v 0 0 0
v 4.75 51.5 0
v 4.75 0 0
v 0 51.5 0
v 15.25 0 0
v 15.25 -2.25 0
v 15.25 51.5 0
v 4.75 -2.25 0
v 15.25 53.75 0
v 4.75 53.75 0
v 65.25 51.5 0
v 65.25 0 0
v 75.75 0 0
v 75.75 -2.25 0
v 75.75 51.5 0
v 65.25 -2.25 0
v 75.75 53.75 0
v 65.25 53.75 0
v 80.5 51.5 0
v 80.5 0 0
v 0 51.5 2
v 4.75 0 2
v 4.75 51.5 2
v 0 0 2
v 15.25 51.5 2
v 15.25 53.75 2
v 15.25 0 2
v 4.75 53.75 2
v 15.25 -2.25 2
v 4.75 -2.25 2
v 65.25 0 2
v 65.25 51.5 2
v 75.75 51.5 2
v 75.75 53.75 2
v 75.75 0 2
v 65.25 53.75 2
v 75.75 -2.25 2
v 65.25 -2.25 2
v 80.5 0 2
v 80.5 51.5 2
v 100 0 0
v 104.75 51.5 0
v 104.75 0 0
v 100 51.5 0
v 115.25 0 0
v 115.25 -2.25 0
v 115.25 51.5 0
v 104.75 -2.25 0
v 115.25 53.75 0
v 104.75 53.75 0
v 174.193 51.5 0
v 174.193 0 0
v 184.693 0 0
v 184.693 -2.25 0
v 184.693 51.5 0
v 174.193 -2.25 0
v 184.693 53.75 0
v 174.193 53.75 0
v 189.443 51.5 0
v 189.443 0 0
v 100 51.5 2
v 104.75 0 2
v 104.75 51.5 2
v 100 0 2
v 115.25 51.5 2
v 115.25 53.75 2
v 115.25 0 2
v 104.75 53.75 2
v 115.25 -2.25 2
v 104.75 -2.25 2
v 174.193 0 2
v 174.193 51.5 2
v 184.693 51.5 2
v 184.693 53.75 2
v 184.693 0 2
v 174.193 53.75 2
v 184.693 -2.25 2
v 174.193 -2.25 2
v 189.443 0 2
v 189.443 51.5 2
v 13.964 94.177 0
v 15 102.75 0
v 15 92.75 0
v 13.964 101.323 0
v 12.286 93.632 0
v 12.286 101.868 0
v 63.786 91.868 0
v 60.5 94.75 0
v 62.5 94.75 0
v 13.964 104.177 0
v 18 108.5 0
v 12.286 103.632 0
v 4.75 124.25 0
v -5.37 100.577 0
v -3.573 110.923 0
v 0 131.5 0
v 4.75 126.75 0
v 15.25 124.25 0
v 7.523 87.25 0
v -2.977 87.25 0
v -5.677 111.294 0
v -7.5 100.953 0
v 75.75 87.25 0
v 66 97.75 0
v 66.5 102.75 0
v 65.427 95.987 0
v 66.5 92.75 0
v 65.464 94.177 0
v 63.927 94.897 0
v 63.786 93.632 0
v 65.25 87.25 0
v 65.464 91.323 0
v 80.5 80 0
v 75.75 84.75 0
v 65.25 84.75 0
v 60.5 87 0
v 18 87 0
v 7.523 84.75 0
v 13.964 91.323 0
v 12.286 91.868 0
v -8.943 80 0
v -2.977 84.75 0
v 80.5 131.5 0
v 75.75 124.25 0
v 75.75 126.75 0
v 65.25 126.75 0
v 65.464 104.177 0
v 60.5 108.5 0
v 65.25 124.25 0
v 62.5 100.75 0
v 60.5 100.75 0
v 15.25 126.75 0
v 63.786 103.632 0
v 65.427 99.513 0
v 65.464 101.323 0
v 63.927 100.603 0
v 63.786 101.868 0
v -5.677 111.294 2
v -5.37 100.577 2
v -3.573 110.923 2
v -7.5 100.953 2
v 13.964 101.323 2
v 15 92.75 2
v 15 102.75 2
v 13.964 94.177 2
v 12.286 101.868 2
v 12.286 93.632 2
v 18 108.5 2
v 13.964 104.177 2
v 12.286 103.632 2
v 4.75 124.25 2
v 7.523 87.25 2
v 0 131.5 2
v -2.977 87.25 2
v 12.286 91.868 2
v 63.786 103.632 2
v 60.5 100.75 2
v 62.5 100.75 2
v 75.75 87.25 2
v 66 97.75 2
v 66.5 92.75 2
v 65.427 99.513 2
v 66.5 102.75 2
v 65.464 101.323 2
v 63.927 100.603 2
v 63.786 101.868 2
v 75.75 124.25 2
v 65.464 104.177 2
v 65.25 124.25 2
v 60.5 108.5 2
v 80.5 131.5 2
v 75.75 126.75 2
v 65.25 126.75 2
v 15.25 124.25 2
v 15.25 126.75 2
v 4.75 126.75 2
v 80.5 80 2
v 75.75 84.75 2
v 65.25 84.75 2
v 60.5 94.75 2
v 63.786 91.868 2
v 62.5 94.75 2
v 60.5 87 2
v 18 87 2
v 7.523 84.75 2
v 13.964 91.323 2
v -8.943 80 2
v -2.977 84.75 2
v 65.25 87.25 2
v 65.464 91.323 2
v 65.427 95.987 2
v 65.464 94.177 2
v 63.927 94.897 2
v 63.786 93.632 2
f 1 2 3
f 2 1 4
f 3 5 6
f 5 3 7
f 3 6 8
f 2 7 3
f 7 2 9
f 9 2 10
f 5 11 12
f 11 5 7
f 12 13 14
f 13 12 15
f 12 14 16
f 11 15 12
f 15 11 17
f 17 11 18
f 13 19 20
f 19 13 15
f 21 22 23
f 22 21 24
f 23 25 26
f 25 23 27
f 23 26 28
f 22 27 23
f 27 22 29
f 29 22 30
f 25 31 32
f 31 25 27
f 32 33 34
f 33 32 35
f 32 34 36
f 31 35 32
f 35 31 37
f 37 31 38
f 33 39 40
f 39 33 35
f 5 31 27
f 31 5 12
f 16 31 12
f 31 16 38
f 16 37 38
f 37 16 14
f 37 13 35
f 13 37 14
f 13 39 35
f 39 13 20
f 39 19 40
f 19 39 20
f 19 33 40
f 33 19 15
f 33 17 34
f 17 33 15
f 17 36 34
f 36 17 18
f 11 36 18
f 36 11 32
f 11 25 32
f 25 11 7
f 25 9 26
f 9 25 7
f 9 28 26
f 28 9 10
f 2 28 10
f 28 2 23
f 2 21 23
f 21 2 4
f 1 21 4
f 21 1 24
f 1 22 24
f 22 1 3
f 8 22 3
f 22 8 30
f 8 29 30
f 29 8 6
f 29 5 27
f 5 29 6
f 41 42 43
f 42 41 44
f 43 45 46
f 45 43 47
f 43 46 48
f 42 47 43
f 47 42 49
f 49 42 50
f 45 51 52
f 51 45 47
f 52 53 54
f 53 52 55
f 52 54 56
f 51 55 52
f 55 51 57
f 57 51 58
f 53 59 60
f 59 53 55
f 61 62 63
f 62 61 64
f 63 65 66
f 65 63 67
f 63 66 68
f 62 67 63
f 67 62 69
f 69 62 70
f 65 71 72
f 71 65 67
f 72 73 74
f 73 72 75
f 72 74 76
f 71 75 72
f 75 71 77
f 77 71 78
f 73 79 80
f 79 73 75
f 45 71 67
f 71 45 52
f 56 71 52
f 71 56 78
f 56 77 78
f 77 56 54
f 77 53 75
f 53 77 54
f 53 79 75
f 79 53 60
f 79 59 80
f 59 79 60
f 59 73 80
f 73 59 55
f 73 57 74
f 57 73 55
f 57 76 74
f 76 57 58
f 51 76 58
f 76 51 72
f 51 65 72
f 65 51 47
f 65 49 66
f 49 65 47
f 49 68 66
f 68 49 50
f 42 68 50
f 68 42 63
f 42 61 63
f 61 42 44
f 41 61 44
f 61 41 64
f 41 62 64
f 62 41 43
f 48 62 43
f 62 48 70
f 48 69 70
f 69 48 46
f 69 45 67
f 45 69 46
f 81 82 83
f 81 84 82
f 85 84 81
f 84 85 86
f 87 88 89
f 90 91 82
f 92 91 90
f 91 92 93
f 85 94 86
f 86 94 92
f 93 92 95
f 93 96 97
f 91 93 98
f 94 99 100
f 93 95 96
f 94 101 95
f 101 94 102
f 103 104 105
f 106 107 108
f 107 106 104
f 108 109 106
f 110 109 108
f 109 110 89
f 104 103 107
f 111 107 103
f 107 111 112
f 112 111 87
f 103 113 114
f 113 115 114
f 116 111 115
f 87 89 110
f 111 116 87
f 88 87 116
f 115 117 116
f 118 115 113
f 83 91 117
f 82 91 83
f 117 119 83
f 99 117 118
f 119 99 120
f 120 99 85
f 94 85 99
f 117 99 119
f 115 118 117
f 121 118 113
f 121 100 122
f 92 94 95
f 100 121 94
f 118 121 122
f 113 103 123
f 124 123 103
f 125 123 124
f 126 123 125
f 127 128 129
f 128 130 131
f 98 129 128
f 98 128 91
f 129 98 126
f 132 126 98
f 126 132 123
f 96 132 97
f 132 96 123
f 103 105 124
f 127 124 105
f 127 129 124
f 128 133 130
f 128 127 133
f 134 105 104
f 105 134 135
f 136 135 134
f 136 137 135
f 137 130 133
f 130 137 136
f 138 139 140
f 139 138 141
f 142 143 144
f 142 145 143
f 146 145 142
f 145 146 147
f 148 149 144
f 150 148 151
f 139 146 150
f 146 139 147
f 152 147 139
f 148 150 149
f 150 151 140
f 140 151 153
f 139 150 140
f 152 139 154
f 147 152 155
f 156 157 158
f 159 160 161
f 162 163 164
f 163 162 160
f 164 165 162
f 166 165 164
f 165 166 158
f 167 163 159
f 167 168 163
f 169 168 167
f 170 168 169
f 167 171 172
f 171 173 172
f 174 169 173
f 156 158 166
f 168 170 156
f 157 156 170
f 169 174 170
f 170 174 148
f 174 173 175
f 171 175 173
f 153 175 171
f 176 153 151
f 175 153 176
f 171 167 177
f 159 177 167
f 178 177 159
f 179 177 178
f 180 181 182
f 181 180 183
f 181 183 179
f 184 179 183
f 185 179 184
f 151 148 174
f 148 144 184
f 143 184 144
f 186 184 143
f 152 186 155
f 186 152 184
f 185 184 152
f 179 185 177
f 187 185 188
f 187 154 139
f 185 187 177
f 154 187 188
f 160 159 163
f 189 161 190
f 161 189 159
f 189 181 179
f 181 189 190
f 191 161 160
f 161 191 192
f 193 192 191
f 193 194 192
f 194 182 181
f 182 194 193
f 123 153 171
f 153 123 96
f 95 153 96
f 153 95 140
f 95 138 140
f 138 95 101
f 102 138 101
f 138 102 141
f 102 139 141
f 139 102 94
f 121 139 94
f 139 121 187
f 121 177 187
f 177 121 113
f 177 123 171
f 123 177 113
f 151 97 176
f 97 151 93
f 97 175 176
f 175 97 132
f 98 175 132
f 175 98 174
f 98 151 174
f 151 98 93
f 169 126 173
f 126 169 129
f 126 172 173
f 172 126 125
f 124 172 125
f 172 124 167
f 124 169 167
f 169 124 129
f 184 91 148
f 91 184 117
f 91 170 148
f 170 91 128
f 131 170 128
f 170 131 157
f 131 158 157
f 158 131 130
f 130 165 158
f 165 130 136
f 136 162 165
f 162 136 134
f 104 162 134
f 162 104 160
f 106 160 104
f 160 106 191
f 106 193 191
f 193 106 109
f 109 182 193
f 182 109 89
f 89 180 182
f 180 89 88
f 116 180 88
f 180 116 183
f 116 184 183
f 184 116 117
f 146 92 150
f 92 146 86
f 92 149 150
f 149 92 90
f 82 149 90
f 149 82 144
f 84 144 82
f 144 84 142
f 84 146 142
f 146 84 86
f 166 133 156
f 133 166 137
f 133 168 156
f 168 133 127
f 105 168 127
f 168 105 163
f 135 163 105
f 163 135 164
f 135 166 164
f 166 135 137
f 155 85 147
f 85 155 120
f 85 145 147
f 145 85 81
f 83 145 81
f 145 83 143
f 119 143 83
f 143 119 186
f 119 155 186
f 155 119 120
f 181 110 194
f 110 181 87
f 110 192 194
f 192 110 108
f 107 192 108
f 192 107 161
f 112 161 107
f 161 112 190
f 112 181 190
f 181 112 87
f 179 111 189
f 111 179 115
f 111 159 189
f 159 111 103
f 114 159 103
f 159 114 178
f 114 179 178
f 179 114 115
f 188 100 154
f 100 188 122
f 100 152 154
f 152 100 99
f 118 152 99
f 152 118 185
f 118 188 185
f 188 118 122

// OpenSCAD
/* Parameters */

material_thickness = 2;
battery_case_height = 16;
servo_height = 21.5;
servo_length = 42.5;
sled_length = 80.5;
tab_edge_distance = 5;
tab_spacing = 0.5;
tab_length = 10;
ramp_angle = 80;

screw_diameter = 3;


/* Calculated Values */

sled_height = ((material_thickness + tab_edge_distance) * 2 ) + 
	servo_height + battery_case_height;
ramp_length = cos( ramp_angle ) * sled_height;
side_length = sled_length + ramp_length;

/* Functions */

module servo_hole() {
	square([servo_length, servo_height]);
	// screw holes
	translate([-4.5,(servo_height/2)+5])
		circle(d=screw_diameter);
	translate([-4.5,(servo_height/2)-5])
		circle(d=screw_diameter);
	translate([servo_length+4.5,(servo_height/2)+5])
		circle(d=screw_diameter);
	translate([servo_length+4.5,(servo_height/2)-5])
		circle(d=screw_diameter);
	// wire hole
	hull() {
		translate([servo_length-1,servo_height/2])
			square(6,center=true);
		translate([servo_length+2.5,servo_height/2])
			circle(3,center=true);
	}

}

module tab() {
square([tab_length, material_thickness]);
}

module tab_hole() {
	translate([tab_spacing/-2,tab_spacing/-2])
		square([tab_length + tab_spacing, material_thickness +tab_spacing]);
}

module tab() {
	tab_hole();
}


module side() {
	linear_extrude(height=material_thickness)
	difference() {

		union() {
			square([sled_length, sled_height]);
			polygon([[0,0], [0,sled_height], [-ramp_length,0]] );
			translate([-ramp_length/2,sled_height/2])
				rotate(ramp_angle)
				translate([-tab_length/2,-0.1])
				tab();
		}
	
		// Servo hole
		translate([sled_length - servo_length - tab_length - tab_edge_distance - tab_edge_distance, 
				material_thickness + tab_edge_distance])
			servo_hole();

		// Bottom right
		translate([sled_length - tab_length - tab_edge_distance, tab_edge_distance])
			tab_hole();

		// Bottom Left
		translate([-ramp_length + tab_edge_distance + cos(ramp_angle)*(tab_edge_distance+material_thickness), 
				tab_edge_distance])
			tab_hole();

		// Top left
		translate([tab_edge_distance, sled_height - material_thickness - tab_edge_distance])
			tab_hole();

		// Top right
		translate([sled_length - tab_length - tab_edge_distance, 
				sled_height - material_thickness - tab_edge_distance])
			tab_hole();
	}
}


module bottom() {
	linear_extrude(height=material_thickness)
	union() {
		square([side_length,sled_height]);
		translate([tab_edge_distance,-material_thickness])
			tab();
		translate([tab_edge_distance,sled_height])
			tab();
		translate([side_length-tab_length-tab_edge_distance,sled_height])
			tab();
		translate([side_length-tab_length-tab_edge_distance,-material_thickness])
			tab();
	}
}

module top() {
	linear_extrude(height=material_thickness)
	union() {
		square([sled_length,sled_height]);
		translate([tab_edge_distance,-material_thickness])
			tab();
		translate([tab_edge_distance,sled_height])
			tab();
		translate([sled_length-tab_length-tab_edge_distance,sled_height])
			tab();
		translate([sled_length-tab_length-tab_edge_distance,-material_thickness])
			tab();
	}
}

top();

translate([100,0]) bottom();

translate([0,80]) side();
